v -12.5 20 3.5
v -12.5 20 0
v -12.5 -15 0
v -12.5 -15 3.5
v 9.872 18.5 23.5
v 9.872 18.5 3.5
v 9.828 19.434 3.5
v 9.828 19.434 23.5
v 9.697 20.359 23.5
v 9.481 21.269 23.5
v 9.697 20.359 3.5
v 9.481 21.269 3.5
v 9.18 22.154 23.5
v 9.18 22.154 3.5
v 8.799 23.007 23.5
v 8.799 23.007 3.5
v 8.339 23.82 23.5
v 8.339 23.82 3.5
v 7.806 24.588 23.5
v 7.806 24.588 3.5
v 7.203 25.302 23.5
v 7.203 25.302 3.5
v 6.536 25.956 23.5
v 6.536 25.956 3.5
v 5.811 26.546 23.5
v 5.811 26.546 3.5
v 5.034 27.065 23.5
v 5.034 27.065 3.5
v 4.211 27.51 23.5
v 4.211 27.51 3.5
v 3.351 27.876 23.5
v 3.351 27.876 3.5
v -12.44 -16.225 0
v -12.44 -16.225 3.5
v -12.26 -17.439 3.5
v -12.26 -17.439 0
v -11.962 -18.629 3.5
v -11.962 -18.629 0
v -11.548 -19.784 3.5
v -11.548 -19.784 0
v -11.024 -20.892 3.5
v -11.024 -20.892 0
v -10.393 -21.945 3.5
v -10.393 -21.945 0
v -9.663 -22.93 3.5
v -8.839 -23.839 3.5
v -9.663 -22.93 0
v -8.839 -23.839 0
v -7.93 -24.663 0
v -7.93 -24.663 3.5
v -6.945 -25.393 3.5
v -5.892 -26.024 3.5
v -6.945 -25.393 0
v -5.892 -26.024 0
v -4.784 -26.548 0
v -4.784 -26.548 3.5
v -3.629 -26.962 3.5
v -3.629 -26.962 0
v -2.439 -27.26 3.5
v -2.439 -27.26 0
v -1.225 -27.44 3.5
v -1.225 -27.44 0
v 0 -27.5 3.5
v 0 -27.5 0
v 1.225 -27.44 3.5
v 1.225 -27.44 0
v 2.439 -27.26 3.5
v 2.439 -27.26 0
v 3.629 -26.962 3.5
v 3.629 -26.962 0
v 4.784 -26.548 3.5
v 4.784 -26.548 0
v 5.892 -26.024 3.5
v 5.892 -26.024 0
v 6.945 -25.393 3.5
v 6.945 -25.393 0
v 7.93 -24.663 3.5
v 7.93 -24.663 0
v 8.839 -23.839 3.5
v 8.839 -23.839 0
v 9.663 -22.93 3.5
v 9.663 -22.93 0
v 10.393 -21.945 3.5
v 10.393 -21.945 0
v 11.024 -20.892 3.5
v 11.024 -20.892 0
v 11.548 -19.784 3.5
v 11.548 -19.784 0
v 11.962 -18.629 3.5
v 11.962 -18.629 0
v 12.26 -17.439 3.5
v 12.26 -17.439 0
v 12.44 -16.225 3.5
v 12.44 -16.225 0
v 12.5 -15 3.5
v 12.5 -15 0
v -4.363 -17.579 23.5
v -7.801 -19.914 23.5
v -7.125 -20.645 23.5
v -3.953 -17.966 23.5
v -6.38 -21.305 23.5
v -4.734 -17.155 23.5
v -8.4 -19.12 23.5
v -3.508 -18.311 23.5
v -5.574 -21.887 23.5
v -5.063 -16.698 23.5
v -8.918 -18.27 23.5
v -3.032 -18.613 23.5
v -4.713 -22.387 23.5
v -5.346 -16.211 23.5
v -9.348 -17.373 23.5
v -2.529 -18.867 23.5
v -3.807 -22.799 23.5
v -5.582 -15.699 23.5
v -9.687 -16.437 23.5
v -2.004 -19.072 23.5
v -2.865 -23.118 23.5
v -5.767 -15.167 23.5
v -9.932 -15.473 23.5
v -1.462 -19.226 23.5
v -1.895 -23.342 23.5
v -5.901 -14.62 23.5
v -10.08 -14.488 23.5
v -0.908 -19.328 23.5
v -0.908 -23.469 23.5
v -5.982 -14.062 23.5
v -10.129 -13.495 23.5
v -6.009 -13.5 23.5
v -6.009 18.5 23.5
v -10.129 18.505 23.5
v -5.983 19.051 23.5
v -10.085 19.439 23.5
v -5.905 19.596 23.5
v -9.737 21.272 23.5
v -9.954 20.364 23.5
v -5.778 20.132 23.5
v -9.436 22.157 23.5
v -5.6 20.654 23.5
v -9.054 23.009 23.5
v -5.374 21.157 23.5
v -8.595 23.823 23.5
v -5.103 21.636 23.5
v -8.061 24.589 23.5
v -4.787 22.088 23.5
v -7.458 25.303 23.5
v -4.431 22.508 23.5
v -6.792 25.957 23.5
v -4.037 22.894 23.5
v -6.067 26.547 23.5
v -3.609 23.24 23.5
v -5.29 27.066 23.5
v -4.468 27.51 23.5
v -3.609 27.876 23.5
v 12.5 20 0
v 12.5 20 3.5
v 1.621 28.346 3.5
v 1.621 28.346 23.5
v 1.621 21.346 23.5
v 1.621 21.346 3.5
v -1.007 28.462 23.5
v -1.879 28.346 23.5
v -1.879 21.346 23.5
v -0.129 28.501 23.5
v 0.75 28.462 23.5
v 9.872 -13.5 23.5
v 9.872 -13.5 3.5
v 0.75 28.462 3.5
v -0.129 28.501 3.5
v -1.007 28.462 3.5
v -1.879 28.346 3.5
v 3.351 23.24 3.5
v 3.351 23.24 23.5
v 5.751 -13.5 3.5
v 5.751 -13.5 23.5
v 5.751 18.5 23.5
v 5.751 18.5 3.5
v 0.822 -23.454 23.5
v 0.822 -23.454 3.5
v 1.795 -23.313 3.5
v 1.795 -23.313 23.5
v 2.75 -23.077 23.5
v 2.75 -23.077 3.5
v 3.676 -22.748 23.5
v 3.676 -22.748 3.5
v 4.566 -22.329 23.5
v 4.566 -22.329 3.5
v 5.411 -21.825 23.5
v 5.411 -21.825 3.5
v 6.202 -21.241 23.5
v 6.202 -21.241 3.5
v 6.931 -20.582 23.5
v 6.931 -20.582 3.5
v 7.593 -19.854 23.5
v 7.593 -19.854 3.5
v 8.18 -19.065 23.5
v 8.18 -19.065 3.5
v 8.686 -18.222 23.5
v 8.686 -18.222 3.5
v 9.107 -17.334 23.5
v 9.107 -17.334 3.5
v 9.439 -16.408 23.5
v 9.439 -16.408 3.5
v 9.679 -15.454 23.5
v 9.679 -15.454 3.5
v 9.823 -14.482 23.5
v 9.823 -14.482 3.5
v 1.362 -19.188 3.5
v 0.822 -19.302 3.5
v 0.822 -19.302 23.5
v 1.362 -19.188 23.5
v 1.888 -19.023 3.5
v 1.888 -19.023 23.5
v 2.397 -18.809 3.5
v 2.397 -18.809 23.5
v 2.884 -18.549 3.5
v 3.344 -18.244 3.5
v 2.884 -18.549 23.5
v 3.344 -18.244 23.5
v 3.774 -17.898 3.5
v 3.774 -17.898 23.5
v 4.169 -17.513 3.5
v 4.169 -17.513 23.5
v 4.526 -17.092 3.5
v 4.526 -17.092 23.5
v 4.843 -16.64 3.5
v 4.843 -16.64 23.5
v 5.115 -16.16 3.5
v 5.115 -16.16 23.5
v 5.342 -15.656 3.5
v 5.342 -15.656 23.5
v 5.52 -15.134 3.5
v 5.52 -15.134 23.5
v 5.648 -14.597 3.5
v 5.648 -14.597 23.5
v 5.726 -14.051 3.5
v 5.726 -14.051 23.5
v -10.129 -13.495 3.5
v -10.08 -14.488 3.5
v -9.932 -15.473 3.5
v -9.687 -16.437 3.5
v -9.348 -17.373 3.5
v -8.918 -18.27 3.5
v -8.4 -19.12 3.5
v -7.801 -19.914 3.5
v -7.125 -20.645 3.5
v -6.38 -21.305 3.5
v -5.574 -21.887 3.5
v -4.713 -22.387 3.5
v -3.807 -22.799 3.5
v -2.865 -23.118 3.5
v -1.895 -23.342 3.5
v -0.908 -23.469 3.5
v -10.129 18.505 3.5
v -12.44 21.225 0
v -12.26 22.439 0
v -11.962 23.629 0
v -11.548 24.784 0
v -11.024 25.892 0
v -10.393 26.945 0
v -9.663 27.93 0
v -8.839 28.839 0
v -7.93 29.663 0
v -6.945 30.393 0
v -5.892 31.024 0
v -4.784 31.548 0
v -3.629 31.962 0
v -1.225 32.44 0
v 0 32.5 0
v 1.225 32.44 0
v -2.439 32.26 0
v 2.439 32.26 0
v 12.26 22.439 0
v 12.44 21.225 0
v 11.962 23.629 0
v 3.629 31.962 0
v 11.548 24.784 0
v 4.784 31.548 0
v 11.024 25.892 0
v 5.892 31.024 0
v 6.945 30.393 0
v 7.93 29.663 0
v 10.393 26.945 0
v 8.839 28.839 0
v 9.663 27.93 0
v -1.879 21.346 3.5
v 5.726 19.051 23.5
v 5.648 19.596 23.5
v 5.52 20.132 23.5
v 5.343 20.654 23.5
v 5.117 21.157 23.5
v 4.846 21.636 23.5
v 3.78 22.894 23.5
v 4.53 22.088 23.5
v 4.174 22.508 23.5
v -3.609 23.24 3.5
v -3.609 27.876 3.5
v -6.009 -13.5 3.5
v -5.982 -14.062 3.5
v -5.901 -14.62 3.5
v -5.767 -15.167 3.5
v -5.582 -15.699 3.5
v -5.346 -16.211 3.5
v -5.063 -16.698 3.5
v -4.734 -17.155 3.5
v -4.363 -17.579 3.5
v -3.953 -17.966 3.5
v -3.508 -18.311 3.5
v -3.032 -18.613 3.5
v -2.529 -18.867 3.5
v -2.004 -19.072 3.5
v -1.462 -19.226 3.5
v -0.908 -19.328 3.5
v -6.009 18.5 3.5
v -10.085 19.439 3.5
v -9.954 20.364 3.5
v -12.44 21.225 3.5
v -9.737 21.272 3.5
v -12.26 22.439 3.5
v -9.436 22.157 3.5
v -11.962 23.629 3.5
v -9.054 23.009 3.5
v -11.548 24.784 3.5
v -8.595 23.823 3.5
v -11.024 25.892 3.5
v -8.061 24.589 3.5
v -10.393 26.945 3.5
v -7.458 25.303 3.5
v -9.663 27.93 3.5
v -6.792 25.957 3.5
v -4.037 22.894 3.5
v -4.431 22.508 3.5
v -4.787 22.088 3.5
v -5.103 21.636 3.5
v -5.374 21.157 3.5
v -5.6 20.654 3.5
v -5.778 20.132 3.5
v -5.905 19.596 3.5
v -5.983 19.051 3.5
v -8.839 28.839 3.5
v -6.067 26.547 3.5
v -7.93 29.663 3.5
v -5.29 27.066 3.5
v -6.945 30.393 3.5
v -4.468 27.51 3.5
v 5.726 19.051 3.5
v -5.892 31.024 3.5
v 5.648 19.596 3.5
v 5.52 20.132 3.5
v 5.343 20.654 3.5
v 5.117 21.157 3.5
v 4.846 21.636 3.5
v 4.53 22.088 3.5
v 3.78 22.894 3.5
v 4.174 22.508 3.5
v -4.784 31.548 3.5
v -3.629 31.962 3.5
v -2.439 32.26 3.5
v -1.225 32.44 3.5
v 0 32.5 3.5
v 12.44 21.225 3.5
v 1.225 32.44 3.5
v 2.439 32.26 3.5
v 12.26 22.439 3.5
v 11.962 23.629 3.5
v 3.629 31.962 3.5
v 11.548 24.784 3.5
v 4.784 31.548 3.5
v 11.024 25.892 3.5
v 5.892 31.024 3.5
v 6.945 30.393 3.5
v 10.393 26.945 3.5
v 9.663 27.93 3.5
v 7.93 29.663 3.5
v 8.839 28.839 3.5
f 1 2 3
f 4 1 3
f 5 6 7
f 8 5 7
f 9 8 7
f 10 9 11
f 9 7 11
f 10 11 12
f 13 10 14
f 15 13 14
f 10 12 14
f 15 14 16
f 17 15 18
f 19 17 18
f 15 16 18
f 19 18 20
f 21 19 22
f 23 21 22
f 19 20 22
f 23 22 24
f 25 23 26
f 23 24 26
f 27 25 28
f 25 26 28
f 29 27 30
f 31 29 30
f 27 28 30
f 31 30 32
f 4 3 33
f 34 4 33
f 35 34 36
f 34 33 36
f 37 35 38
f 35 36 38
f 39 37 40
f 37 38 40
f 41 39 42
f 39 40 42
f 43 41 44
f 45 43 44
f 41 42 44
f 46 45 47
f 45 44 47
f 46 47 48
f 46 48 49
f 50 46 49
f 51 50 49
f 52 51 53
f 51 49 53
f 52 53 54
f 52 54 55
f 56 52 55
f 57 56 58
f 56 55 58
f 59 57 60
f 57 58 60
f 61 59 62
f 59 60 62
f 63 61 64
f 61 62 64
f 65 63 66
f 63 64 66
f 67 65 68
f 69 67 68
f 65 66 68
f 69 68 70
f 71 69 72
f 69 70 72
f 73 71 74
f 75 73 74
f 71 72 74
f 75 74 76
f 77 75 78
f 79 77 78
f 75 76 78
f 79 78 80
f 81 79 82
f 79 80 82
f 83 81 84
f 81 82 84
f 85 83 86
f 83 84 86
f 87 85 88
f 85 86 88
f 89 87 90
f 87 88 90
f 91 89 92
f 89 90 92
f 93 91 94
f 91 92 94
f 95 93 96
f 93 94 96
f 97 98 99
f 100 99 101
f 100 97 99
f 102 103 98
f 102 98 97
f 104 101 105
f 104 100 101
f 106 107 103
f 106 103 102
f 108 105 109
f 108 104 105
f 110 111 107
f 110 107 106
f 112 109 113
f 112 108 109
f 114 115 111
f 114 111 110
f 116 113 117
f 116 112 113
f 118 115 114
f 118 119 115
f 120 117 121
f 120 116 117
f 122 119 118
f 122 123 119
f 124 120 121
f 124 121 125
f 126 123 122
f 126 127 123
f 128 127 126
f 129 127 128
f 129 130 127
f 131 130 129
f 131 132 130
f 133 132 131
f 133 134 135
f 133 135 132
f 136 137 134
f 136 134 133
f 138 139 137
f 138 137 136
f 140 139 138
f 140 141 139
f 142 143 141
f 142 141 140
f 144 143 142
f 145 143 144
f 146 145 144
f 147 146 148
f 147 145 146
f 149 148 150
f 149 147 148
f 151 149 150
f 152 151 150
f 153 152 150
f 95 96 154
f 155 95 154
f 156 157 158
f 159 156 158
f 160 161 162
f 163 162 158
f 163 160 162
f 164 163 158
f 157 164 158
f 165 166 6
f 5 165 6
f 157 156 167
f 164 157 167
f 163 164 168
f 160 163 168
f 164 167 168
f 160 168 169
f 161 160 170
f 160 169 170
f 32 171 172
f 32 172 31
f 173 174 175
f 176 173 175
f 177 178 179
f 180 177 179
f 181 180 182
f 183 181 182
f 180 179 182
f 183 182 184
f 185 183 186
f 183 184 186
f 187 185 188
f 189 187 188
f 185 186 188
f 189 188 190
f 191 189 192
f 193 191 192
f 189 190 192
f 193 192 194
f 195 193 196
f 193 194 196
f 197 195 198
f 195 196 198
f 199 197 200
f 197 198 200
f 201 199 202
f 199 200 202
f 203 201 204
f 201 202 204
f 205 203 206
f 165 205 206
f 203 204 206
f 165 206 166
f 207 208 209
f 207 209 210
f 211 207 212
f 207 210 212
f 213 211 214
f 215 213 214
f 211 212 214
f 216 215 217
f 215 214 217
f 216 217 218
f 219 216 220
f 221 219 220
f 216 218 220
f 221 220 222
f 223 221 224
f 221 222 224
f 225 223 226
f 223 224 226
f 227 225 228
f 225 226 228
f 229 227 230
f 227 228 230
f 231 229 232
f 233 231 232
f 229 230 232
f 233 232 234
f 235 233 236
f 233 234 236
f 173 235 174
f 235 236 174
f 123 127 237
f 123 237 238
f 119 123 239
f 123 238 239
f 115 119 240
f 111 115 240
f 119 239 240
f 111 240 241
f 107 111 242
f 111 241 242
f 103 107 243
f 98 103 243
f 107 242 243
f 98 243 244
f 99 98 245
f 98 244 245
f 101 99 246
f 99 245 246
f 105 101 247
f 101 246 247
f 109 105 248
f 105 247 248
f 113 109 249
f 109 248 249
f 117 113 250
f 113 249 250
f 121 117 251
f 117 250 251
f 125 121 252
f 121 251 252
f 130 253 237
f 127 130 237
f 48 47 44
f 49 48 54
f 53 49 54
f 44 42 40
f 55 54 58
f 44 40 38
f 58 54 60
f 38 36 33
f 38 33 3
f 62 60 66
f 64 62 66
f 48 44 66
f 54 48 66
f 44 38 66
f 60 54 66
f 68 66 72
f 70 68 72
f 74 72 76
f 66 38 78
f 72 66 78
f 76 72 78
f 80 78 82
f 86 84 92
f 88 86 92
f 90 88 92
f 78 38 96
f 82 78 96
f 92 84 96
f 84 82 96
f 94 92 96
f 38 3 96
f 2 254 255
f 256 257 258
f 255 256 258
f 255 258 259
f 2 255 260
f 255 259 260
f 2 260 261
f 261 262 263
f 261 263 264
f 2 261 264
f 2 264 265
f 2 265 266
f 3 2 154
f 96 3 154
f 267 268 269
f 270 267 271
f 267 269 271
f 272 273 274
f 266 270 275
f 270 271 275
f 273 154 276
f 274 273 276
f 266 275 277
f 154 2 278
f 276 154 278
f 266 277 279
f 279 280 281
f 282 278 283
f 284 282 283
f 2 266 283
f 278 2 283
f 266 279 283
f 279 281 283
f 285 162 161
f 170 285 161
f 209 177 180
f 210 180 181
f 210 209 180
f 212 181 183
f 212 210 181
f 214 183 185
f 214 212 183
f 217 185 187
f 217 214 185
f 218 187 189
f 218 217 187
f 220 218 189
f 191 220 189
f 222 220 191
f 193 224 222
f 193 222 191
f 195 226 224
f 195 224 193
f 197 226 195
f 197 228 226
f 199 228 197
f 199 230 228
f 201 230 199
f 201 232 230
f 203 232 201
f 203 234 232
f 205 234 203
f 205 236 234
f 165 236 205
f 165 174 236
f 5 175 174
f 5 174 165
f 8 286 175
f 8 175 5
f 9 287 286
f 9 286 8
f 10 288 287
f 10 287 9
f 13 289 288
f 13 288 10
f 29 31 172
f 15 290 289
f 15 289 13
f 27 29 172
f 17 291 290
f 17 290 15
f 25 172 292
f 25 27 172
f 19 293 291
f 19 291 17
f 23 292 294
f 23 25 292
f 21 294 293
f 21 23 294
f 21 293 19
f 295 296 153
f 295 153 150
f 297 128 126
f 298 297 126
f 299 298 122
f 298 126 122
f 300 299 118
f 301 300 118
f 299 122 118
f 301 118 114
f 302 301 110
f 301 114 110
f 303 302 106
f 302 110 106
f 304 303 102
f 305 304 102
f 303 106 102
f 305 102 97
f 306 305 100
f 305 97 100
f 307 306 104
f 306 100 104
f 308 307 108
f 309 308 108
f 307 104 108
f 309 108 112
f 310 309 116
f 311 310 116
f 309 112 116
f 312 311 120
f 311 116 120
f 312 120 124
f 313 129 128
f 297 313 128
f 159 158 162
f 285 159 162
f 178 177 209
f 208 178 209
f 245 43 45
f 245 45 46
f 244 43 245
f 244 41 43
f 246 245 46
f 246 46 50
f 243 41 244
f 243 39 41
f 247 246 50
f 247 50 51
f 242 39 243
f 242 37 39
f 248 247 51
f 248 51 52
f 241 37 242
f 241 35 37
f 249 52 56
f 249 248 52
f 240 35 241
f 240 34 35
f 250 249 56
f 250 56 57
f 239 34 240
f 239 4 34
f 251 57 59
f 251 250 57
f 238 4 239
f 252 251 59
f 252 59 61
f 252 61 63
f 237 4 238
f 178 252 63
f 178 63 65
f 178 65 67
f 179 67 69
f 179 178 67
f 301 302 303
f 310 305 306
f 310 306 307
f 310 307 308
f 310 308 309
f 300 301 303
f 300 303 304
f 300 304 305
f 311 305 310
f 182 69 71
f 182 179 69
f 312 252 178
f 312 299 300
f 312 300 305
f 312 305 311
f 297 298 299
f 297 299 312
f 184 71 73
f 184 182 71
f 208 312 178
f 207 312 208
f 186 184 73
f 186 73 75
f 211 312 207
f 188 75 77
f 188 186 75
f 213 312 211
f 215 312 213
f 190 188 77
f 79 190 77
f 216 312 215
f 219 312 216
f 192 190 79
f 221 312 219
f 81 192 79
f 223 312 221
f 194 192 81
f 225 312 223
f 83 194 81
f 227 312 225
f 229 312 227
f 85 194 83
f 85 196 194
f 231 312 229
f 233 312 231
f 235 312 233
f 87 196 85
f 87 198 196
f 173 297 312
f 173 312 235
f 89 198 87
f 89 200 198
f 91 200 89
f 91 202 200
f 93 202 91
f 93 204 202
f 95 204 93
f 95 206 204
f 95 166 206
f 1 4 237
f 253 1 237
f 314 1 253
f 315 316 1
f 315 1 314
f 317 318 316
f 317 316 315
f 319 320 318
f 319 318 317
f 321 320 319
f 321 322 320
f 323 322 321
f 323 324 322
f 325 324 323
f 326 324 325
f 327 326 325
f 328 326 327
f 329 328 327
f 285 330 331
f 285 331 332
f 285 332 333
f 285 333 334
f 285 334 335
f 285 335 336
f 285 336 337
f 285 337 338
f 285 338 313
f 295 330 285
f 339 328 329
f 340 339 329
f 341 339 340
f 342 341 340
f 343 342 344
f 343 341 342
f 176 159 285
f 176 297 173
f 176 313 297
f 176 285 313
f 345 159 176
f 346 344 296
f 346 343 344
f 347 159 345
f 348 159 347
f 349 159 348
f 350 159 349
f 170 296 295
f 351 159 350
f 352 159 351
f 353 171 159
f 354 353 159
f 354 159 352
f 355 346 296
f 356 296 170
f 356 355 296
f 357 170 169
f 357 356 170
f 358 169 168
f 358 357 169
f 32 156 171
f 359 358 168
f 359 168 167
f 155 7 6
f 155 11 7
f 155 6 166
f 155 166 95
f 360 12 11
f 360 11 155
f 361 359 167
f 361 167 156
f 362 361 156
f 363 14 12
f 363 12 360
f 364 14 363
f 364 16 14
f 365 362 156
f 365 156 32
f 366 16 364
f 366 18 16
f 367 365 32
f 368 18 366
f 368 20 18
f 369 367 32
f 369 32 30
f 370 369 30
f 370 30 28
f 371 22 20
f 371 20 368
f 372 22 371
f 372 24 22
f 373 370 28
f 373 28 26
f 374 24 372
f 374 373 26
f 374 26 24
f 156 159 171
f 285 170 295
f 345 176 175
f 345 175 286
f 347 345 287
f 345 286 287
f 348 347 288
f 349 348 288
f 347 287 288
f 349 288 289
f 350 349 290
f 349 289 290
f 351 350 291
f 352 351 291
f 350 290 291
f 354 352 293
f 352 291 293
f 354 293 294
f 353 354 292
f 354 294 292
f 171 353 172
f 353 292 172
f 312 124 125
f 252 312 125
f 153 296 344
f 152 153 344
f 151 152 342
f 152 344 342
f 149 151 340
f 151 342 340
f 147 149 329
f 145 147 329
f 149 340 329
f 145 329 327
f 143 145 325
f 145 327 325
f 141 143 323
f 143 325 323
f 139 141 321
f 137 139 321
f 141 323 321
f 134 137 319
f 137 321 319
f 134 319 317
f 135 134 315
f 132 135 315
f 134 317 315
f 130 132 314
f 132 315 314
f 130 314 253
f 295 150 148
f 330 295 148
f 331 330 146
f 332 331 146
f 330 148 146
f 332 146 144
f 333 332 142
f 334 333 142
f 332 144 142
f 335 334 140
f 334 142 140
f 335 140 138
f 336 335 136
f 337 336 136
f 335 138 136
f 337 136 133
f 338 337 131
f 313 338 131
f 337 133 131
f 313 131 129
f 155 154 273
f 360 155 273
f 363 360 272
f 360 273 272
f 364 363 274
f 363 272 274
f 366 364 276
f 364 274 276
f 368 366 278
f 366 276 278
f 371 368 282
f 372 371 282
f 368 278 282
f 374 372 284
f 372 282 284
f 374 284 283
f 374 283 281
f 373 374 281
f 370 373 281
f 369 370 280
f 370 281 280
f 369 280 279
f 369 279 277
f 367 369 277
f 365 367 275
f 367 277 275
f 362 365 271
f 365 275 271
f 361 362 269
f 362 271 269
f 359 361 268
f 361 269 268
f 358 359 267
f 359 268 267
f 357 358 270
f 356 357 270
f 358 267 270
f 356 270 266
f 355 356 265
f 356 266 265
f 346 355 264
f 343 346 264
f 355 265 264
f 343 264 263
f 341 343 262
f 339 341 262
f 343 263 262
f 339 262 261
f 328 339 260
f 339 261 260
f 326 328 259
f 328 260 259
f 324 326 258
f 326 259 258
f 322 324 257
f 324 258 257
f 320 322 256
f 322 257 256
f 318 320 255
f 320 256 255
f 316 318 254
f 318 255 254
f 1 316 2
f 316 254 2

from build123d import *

# Parameters (mm, degrees)
F1_DEPTH = 3.5
F3_DEPTH = 20
F5_DEPTH = 20


with BuildPart() as f1:
    # F0 (on Top) → F1 (new body)
    with BuildSketch(Plane.XY):
        with BuildLine():
            ThreePointArc((12.5, 20), (0, 32.5), (-12.5, 20))
            Line((-12.5, 20), (-12.5, -15))
            ThreePointArc((-12.5, -15), (0, -27.5), (12.5, -15))
            Line((12.5, -15), (12.5, 20))
        make_face()
    extrude(amount=F1_DEPTH)

    # F2 (on face) → F3 (join)
    with BuildSketch(Plane.XY.offset(3.5)):
        with BuildLine():
            ThreePointArc((9.871602, 18.500452), (-0.126027, 28.50059), (-10.128673, 18.50547))
            Line((-10.128673, 18.50547), (-10.128673, -13.49453))
            ThreePointArc((-10.128673, -13.49453), (-0.131046, -23.499687), (9.871602, -13.499548))
            Line((9.871602, -13.499548), (9.871602, 18.500452))
        make_face()
    extrude(amount=F3_DEPTH)

    # F4 (on face) → F5 (cut)
    with BuildSketch(Plane.XY.offset(23.5)):
        with BuildLine():
            ThreePointArc((-3.608536, 23.240072), (-5.374335, 21.156765), (-6.008536, 18.500452))
            Line((-6.008536, 18.500452), (-6.008536, -13.499548))
            ThreePointArc((-6.008536, -13.499548), (-4.553379, -17.371908), (-0.908138, -19.327637))
            Line((-0.908138, -19.327637), (-0.908138, -23.469252))
            ThreePointArc((-0.908138, -23.469252), (-0.035787, -24.319454), (0.821862, -23.454422))
            Line((0.821862, -23.454422), (0.821862, -19.302233))
            ThreePointArc((0.821862, -19.302233), (4.352688, -17.30652), (5.751464, -13.499548))
            Line((5.751464, -13.499548), (5.751464, 18.500452))
            ThreePointArc((5.751464, 18.500452), (5.117262, 21.156765), (3.351464, 23.240072))
            Line((3.351464, 23.240072), (3.351464, 27.875545))
            ThreePointArc((3.351464, 27.875545), (2.584662, 28.471802), (1.621464, 28.346277))
            Line((1.621464, 28.346277), (1.621464, 21.346277))
            Line((1.621464, 21.346277), (-1.878536, 21.346277))
            Line((-1.878536, 21.346277), (-1.878536, 28.346277))
            ThreePointArc((-1.878536, 28.346277), (-2.816511, 28.379103), (-3.608536, 27.875545))
            Line((-3.608536, 27.875545), (-3.608536, 23.240072))
        make_face()
    extrude(amount=-F5_DEPTH, mode=Mode.SUBTRACT)


solid = f1.part
